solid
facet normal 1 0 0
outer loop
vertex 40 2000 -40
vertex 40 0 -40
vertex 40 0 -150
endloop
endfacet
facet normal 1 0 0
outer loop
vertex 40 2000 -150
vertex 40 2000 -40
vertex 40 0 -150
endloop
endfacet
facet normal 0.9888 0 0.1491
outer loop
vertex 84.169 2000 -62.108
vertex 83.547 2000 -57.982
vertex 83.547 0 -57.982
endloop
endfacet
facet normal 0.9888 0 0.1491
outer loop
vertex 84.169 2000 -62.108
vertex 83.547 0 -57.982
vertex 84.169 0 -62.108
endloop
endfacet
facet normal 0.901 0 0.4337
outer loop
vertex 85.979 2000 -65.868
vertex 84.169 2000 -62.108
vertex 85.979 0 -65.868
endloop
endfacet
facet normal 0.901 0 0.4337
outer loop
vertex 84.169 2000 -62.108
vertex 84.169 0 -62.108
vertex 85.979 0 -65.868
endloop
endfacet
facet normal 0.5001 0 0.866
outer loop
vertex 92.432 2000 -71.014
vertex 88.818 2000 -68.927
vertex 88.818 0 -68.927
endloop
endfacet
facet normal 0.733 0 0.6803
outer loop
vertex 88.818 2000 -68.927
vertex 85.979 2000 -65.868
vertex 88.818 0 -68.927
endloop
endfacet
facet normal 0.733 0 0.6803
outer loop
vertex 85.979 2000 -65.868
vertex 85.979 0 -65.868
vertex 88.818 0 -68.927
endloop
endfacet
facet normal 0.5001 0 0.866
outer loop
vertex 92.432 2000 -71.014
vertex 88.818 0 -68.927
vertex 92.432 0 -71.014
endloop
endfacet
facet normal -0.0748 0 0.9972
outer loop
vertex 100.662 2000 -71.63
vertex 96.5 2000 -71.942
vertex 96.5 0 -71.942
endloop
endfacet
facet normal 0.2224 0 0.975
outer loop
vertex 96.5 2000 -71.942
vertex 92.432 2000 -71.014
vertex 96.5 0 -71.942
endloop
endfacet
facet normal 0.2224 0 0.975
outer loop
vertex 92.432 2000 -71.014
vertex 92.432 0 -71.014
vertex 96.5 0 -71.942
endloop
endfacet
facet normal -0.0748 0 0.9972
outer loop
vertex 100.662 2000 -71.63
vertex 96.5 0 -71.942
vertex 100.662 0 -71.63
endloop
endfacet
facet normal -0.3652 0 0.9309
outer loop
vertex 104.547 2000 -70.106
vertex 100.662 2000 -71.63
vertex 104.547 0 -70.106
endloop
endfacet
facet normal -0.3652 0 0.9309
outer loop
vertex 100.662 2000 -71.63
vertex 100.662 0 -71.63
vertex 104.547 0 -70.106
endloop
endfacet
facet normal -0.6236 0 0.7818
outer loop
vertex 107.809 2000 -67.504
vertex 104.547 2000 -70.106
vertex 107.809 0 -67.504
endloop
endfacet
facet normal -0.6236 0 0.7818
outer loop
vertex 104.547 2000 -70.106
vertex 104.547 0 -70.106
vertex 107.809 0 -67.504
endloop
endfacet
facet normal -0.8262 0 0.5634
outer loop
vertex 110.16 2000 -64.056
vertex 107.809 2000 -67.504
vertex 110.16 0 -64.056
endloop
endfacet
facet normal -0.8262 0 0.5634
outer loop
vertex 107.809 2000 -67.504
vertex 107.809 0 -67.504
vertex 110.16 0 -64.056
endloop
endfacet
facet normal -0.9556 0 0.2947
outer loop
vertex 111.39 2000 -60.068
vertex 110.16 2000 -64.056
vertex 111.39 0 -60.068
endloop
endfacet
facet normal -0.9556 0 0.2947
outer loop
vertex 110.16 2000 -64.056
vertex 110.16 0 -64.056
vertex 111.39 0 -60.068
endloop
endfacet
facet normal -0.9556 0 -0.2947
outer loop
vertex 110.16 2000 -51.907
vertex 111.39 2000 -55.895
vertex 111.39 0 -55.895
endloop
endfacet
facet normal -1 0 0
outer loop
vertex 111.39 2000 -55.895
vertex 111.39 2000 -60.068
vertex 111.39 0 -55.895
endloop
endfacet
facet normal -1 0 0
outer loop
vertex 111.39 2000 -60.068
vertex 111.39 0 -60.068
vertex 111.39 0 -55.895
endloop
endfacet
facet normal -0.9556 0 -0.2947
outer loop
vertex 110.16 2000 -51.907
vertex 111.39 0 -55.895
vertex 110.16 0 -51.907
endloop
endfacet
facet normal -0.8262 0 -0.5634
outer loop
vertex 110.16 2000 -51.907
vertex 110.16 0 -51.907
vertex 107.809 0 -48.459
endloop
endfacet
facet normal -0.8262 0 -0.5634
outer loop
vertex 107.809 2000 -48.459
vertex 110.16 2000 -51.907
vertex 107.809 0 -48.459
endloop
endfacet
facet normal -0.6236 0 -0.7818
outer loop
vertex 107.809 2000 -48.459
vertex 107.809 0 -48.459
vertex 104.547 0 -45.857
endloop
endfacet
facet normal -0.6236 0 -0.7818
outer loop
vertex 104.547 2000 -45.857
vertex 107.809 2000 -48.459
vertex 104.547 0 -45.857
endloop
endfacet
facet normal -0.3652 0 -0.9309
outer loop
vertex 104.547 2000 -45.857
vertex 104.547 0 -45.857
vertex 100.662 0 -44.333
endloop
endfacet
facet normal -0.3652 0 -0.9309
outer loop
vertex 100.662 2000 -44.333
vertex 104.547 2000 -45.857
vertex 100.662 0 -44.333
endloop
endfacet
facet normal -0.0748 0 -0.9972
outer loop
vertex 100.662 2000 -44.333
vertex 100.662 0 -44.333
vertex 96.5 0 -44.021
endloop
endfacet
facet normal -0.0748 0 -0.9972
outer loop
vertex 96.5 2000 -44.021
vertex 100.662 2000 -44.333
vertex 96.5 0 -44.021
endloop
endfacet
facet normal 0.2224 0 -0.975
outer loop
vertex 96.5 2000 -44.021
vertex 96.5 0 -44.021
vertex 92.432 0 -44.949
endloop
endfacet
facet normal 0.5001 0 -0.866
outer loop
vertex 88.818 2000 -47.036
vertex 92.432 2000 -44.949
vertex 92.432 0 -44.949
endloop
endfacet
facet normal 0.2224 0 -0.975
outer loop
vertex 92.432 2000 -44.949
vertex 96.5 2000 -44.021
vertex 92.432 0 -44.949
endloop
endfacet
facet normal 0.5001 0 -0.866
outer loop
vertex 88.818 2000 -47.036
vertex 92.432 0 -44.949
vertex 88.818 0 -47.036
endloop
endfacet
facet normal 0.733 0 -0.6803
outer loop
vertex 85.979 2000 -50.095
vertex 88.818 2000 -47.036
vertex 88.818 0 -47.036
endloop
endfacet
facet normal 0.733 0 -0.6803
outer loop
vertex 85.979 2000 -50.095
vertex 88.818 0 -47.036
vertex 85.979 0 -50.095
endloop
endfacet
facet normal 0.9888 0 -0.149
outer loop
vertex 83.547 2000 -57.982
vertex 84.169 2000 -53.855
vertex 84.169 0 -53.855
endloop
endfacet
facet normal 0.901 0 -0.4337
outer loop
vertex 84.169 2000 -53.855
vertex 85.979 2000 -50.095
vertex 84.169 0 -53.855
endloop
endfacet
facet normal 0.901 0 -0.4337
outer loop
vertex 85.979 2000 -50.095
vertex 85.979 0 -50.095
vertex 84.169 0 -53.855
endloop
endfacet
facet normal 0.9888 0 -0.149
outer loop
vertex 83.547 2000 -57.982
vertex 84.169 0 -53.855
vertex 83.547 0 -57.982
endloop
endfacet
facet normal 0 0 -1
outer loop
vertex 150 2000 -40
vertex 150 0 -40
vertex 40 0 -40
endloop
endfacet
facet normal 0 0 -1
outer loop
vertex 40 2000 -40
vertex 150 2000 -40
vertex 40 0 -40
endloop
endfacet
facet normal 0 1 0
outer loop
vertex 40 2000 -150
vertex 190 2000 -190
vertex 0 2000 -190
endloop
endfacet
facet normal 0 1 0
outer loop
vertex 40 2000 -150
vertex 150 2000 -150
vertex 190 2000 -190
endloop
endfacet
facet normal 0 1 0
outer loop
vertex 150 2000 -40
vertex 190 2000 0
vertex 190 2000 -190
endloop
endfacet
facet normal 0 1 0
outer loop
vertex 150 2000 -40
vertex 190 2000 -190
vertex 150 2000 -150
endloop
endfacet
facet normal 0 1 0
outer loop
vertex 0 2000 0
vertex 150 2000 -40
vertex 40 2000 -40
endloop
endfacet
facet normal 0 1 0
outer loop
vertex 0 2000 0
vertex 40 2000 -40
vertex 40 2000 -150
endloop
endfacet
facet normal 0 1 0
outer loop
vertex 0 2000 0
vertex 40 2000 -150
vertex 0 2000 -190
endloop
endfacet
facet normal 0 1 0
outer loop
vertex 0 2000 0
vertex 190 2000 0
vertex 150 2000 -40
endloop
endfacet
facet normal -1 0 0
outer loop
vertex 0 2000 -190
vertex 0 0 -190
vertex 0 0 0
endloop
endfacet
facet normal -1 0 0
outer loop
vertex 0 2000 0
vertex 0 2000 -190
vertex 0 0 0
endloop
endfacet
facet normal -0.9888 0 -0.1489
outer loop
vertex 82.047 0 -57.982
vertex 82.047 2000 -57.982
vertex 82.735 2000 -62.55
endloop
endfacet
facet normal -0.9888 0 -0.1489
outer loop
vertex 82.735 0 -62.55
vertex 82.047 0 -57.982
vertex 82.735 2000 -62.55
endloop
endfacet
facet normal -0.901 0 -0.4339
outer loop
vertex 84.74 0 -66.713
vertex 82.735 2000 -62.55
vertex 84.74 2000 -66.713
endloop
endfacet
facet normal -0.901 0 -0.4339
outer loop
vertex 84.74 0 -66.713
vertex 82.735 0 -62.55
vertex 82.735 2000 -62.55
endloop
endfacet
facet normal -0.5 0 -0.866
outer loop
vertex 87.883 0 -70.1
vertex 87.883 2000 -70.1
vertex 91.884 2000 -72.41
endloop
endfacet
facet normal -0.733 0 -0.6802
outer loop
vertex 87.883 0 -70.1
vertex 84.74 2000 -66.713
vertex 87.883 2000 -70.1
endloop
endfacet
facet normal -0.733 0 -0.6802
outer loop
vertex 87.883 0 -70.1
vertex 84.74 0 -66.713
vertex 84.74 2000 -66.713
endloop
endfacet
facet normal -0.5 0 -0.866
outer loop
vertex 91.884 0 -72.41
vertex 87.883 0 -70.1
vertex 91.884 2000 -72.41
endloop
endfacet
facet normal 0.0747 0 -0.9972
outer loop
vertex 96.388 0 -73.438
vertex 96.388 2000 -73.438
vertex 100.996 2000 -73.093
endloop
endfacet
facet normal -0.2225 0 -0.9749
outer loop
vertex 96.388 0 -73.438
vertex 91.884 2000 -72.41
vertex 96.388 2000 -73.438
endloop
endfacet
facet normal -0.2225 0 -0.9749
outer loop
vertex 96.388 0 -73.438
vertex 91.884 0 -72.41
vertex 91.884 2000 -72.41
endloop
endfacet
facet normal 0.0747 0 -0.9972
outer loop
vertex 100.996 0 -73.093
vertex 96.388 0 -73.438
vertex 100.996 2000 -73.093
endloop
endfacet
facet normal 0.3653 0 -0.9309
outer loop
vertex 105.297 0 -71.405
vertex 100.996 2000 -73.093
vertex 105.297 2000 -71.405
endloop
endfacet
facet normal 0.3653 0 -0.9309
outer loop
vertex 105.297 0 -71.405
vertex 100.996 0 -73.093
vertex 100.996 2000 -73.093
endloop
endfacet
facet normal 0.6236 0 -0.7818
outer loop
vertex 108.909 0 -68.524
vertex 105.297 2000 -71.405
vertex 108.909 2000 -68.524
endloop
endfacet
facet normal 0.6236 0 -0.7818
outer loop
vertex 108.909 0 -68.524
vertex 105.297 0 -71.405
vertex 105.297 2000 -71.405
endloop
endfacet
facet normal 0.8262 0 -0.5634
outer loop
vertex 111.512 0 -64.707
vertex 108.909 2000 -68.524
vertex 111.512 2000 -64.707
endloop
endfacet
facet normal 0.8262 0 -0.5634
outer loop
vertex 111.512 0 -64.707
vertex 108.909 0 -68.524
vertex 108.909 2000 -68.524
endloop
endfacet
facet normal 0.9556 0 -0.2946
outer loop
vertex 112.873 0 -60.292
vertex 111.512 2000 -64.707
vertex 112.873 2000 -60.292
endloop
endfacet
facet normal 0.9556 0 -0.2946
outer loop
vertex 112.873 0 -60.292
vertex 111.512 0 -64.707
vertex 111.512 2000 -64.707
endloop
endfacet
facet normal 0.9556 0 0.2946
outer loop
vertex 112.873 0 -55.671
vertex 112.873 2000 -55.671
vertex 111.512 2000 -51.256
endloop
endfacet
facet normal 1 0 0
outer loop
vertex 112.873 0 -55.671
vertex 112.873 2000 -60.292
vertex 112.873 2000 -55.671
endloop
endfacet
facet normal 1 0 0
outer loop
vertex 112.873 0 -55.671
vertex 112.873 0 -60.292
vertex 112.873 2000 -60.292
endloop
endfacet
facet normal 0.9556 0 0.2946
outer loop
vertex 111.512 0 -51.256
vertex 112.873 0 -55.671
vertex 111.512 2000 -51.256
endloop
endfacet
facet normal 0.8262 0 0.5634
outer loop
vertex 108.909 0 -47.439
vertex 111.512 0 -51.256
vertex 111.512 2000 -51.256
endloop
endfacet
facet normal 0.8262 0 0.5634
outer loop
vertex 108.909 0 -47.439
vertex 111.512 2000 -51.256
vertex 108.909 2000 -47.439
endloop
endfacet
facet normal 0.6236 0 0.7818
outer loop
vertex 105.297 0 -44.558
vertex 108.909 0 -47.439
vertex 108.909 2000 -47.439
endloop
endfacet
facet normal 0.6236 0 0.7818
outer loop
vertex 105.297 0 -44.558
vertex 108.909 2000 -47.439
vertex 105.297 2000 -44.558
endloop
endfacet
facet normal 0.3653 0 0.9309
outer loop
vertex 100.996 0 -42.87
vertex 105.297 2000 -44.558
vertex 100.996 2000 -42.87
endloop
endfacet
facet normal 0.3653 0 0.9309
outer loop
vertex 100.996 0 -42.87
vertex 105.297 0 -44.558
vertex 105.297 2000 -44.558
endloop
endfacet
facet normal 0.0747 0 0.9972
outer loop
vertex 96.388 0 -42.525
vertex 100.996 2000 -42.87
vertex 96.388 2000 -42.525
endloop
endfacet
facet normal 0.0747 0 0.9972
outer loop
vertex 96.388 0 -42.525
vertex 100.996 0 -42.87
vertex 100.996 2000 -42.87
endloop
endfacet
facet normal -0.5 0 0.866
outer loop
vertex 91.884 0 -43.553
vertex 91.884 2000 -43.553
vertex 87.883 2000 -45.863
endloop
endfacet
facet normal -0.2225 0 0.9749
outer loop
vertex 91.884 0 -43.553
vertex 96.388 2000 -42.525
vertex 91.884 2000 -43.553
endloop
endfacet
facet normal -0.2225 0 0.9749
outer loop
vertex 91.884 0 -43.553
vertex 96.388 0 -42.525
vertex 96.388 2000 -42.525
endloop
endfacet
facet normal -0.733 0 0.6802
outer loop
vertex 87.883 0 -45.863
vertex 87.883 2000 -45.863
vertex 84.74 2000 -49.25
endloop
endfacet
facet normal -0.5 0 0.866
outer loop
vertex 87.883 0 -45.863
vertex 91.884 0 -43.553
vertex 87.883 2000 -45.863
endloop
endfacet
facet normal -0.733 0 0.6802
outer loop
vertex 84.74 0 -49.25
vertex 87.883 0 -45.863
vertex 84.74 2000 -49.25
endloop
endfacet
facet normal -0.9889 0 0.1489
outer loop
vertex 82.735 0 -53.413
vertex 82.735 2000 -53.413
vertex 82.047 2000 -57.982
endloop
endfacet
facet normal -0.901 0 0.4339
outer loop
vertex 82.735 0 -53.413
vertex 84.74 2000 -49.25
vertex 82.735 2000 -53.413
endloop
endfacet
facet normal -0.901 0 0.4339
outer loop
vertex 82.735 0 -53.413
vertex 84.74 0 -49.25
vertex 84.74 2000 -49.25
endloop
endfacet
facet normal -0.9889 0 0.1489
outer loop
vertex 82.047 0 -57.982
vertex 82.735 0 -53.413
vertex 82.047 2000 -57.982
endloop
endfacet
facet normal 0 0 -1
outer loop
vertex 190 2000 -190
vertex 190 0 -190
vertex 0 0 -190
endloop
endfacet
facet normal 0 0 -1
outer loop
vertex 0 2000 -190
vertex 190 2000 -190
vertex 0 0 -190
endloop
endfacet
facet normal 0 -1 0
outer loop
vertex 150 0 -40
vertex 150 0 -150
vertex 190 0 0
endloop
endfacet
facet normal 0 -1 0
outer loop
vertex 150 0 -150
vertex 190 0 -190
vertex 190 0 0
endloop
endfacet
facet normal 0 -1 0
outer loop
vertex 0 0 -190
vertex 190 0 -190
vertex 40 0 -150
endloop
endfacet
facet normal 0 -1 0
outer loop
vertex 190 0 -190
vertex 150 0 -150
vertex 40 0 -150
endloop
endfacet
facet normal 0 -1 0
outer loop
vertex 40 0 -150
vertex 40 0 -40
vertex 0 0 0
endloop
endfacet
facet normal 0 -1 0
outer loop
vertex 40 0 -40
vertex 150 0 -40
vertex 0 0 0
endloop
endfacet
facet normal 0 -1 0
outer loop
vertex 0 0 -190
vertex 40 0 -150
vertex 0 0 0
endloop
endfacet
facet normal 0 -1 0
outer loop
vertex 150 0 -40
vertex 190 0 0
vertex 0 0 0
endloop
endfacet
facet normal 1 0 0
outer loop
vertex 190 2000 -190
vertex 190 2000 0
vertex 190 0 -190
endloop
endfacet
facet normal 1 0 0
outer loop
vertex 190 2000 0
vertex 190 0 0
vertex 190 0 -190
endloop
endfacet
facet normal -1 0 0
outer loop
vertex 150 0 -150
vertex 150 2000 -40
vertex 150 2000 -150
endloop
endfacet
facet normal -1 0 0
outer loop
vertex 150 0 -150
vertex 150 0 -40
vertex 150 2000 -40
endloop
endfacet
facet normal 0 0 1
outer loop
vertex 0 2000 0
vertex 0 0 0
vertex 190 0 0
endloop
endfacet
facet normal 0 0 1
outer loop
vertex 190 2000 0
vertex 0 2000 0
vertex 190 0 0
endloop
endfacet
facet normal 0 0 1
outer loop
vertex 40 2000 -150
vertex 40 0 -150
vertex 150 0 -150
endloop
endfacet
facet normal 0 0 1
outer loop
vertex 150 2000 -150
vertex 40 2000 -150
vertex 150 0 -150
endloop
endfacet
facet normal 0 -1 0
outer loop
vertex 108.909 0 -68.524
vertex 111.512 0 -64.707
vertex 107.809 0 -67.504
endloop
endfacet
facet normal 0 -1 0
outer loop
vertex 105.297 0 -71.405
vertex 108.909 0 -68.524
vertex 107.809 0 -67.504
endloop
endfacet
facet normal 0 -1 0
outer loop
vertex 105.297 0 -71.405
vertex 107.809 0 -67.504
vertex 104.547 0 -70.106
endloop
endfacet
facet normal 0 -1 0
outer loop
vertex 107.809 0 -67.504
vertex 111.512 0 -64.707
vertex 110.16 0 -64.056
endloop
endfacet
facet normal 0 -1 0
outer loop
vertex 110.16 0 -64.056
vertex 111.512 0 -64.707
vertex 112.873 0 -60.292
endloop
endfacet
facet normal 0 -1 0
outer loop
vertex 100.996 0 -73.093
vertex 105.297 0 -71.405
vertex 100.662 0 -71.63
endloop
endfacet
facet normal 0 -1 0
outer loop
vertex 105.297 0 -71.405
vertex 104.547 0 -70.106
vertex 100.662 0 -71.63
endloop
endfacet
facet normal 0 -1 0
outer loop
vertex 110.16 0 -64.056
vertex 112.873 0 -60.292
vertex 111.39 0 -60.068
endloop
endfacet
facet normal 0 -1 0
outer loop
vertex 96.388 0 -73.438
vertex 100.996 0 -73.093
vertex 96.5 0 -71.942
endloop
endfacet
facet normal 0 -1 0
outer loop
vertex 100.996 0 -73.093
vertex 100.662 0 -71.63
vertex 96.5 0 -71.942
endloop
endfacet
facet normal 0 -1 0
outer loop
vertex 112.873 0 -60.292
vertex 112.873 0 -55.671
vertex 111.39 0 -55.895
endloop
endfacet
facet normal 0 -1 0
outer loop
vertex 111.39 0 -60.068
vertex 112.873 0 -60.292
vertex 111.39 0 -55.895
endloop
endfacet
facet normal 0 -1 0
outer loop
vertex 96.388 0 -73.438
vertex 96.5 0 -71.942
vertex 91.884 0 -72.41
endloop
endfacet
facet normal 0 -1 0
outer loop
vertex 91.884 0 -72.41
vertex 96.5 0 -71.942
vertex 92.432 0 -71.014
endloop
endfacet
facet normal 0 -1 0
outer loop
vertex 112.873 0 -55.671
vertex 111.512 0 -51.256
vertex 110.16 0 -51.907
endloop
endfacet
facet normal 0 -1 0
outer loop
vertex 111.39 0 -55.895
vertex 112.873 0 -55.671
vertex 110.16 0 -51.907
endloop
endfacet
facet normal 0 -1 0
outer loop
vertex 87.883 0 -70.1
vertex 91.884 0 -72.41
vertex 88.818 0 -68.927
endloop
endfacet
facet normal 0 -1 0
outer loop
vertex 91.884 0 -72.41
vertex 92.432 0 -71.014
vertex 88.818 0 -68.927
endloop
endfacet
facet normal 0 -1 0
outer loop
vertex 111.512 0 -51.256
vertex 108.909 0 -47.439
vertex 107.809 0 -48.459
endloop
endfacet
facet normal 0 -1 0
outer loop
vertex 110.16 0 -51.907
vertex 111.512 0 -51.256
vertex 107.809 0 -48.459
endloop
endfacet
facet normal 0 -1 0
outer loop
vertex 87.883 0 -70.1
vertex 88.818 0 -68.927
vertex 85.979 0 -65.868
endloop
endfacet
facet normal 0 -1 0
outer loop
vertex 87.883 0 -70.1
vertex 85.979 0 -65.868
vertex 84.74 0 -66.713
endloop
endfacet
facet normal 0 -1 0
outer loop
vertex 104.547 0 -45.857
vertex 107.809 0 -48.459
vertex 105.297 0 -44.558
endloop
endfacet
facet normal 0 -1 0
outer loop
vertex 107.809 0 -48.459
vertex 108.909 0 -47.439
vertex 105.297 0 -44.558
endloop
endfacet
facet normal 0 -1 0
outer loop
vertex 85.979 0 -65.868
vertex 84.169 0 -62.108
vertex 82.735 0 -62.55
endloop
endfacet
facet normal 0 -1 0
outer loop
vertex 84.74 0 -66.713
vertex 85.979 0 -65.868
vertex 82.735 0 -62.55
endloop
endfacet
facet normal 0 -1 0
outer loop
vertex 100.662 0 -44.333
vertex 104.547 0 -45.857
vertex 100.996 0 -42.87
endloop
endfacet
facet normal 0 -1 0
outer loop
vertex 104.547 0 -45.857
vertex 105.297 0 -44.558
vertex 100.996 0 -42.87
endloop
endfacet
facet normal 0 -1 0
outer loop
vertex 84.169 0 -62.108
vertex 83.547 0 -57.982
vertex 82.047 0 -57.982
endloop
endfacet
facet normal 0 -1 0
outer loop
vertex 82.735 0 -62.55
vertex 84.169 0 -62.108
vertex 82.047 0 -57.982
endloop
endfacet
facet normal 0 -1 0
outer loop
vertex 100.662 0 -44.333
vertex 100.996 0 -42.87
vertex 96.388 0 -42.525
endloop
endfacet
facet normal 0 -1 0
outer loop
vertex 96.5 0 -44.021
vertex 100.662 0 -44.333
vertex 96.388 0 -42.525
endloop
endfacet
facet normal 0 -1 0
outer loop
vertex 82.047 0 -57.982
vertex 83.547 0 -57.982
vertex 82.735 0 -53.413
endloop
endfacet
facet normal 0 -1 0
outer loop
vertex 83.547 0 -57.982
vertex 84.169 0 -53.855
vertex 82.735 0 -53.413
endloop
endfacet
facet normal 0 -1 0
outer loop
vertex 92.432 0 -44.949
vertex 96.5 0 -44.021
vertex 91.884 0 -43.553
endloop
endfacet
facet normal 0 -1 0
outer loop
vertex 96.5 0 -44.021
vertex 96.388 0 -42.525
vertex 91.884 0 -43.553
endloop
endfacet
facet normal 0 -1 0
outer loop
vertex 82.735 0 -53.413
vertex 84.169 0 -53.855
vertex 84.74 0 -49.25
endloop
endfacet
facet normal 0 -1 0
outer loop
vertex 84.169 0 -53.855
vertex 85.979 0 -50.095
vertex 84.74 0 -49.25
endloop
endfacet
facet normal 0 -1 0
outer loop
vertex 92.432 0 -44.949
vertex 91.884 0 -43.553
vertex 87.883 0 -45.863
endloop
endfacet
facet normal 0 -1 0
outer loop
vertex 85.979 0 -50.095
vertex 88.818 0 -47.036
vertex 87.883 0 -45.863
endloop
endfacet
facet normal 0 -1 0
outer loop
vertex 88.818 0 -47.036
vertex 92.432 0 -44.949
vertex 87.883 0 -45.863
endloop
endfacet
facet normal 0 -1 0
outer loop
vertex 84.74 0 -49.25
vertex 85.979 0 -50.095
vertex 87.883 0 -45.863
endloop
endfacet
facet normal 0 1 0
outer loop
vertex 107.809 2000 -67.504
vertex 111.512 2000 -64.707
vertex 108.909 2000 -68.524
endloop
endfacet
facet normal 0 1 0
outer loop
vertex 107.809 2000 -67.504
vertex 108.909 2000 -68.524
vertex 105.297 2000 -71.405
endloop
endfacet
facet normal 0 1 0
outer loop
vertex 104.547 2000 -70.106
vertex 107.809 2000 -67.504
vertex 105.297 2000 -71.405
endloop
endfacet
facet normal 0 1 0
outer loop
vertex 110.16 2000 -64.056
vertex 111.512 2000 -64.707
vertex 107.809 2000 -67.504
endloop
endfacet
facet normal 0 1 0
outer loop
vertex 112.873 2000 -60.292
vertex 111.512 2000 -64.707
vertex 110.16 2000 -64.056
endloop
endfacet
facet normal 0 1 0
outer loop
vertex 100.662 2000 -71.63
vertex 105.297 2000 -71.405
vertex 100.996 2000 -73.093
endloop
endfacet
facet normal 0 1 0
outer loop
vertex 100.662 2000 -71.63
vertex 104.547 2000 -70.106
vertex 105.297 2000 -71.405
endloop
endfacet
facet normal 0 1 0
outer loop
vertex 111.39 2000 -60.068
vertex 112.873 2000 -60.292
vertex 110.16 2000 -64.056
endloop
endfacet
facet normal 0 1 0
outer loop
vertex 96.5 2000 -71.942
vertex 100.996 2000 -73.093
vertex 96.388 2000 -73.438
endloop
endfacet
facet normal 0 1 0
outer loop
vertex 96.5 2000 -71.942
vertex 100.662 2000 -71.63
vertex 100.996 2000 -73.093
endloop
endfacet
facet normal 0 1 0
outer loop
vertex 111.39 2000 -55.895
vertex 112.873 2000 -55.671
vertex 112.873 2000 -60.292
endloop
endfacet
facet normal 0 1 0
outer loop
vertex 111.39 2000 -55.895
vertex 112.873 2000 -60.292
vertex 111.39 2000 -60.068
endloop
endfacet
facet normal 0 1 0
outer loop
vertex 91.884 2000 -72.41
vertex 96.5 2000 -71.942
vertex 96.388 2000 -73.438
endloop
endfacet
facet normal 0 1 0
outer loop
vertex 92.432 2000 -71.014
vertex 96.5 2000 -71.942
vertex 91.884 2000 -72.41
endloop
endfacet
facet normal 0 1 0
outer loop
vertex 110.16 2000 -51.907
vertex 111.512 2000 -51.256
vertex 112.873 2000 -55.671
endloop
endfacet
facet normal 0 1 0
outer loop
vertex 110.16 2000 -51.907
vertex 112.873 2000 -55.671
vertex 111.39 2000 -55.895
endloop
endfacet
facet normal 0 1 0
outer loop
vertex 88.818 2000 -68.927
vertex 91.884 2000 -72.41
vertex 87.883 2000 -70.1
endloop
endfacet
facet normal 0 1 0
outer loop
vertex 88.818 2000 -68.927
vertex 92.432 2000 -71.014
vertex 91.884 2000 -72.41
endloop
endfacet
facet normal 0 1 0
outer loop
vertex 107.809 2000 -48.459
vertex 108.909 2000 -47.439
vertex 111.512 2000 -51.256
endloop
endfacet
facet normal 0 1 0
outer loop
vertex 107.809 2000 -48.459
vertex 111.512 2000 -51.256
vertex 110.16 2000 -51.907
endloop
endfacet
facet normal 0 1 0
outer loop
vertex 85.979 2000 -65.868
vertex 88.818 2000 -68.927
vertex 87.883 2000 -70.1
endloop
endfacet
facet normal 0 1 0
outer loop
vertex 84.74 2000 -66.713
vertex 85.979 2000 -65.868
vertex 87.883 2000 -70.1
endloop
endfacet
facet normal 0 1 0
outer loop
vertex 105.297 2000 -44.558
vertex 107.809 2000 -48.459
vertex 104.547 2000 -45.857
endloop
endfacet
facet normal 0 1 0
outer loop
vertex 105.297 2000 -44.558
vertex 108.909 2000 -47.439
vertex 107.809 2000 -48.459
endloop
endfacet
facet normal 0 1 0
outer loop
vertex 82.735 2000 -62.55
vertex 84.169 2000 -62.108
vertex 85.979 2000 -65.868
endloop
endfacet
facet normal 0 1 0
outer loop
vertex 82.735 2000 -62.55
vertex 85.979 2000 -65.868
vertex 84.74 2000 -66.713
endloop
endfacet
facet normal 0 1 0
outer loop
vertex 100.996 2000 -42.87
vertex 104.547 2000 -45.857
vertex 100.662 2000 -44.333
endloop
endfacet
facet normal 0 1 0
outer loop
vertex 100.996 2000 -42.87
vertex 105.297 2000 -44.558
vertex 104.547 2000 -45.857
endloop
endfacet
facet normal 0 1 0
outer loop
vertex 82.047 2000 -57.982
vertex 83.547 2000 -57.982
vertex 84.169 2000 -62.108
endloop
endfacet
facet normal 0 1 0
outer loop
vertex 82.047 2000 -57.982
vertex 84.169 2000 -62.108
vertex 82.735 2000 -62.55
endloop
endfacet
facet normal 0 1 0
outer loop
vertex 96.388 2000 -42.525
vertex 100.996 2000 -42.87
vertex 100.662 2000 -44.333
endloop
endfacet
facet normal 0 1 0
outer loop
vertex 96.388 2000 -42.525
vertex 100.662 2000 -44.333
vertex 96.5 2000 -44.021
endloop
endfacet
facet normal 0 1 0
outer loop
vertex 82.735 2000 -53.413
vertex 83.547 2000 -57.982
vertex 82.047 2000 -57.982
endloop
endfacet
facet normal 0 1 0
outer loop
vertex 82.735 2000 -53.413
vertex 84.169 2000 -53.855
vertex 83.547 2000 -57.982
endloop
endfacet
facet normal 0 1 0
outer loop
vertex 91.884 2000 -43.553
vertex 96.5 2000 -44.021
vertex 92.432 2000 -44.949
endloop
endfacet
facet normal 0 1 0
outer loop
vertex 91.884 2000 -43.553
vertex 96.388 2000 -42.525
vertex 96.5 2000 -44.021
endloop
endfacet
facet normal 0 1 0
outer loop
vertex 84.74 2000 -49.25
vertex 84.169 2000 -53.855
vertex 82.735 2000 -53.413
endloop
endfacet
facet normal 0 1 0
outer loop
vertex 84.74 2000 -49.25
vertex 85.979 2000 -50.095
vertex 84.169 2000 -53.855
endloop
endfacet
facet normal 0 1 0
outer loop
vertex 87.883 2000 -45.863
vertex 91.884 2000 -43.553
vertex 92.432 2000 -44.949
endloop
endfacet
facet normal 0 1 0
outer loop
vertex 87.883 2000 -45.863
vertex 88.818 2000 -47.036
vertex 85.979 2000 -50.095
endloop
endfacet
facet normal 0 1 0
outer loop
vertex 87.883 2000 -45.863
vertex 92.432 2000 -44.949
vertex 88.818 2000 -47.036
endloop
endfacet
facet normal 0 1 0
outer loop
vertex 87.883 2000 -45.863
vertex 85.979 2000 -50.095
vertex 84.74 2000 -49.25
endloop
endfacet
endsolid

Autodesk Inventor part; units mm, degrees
ref_plane "YZ Plane" through (0, 0, 0) normal (1, 0, 0) x (0, 1, 0)
ref_plane "XZ Plane" through (0, 0, 0) normal (0, 1, 0) x (-1, 0, 0)
ref_plane "XY Plane" through (0, 0, 0) normal (0, 0, 1) x (1, 0, 0)
sketch "Sketch1" plane through (0, 0, 0) normal (0, 1, 0) x (-1, 0, 0)
  line L0 (0, 0) -> (-190, 0)
  line L1 (-190, 0) -> (-190, -40)
  line L2 (-190, -40) -> (0, -40)
  line L3 (0, -40) -> (0, 0)
  line L4 (0, -40) -> (-40, -40)
  line L5 (-40, -40) -> (-40, -150)
  line L6 (-40, -150) -> (0, -150)
  line L7 (0, -150) -> (0, -40)
  line L8 (-190, -40) -> (-150, -40)
  line L9 (-150, -40) -> (-150, -150)
  line L10 (-150, -150) -> (-190, -150)
  line L11 (-190, -150) -> (-190, -40)
  line L12 (0, -150) -> (-190, -150)
  line L13 (-190, -150) -> (-190, -190)
  line L14 (-190, -190) -> (0, -190)
  line L15 (0, -190) -> (0, -150)
  circle A0 centre (-97.5466, -57.9815) radius 15.5
  circle A1 centre (-97.5466, -57.9815) radius 14
  dimension "d0" = 190
  dimension "d1" = 40
  dimension "d2" = 40
  dimension "d3" = 110
  dimension "d4" = 40
  dimension "d5" = 110
  dimension "d6" = 190
  dimension "d7" = 40
  dimension "d8" = 31
  dimension "d9" = 28
extrude "Extrusion1" add sketch "Sketch1" along normal blind 2000 contours L3 L2 L1 L0 | L7 L6 L5 L2 | L2 L9 L10 L11 | L15 L14 L13 L10 L12 L6 | A0
properties part number "DIY composite curing oven"
